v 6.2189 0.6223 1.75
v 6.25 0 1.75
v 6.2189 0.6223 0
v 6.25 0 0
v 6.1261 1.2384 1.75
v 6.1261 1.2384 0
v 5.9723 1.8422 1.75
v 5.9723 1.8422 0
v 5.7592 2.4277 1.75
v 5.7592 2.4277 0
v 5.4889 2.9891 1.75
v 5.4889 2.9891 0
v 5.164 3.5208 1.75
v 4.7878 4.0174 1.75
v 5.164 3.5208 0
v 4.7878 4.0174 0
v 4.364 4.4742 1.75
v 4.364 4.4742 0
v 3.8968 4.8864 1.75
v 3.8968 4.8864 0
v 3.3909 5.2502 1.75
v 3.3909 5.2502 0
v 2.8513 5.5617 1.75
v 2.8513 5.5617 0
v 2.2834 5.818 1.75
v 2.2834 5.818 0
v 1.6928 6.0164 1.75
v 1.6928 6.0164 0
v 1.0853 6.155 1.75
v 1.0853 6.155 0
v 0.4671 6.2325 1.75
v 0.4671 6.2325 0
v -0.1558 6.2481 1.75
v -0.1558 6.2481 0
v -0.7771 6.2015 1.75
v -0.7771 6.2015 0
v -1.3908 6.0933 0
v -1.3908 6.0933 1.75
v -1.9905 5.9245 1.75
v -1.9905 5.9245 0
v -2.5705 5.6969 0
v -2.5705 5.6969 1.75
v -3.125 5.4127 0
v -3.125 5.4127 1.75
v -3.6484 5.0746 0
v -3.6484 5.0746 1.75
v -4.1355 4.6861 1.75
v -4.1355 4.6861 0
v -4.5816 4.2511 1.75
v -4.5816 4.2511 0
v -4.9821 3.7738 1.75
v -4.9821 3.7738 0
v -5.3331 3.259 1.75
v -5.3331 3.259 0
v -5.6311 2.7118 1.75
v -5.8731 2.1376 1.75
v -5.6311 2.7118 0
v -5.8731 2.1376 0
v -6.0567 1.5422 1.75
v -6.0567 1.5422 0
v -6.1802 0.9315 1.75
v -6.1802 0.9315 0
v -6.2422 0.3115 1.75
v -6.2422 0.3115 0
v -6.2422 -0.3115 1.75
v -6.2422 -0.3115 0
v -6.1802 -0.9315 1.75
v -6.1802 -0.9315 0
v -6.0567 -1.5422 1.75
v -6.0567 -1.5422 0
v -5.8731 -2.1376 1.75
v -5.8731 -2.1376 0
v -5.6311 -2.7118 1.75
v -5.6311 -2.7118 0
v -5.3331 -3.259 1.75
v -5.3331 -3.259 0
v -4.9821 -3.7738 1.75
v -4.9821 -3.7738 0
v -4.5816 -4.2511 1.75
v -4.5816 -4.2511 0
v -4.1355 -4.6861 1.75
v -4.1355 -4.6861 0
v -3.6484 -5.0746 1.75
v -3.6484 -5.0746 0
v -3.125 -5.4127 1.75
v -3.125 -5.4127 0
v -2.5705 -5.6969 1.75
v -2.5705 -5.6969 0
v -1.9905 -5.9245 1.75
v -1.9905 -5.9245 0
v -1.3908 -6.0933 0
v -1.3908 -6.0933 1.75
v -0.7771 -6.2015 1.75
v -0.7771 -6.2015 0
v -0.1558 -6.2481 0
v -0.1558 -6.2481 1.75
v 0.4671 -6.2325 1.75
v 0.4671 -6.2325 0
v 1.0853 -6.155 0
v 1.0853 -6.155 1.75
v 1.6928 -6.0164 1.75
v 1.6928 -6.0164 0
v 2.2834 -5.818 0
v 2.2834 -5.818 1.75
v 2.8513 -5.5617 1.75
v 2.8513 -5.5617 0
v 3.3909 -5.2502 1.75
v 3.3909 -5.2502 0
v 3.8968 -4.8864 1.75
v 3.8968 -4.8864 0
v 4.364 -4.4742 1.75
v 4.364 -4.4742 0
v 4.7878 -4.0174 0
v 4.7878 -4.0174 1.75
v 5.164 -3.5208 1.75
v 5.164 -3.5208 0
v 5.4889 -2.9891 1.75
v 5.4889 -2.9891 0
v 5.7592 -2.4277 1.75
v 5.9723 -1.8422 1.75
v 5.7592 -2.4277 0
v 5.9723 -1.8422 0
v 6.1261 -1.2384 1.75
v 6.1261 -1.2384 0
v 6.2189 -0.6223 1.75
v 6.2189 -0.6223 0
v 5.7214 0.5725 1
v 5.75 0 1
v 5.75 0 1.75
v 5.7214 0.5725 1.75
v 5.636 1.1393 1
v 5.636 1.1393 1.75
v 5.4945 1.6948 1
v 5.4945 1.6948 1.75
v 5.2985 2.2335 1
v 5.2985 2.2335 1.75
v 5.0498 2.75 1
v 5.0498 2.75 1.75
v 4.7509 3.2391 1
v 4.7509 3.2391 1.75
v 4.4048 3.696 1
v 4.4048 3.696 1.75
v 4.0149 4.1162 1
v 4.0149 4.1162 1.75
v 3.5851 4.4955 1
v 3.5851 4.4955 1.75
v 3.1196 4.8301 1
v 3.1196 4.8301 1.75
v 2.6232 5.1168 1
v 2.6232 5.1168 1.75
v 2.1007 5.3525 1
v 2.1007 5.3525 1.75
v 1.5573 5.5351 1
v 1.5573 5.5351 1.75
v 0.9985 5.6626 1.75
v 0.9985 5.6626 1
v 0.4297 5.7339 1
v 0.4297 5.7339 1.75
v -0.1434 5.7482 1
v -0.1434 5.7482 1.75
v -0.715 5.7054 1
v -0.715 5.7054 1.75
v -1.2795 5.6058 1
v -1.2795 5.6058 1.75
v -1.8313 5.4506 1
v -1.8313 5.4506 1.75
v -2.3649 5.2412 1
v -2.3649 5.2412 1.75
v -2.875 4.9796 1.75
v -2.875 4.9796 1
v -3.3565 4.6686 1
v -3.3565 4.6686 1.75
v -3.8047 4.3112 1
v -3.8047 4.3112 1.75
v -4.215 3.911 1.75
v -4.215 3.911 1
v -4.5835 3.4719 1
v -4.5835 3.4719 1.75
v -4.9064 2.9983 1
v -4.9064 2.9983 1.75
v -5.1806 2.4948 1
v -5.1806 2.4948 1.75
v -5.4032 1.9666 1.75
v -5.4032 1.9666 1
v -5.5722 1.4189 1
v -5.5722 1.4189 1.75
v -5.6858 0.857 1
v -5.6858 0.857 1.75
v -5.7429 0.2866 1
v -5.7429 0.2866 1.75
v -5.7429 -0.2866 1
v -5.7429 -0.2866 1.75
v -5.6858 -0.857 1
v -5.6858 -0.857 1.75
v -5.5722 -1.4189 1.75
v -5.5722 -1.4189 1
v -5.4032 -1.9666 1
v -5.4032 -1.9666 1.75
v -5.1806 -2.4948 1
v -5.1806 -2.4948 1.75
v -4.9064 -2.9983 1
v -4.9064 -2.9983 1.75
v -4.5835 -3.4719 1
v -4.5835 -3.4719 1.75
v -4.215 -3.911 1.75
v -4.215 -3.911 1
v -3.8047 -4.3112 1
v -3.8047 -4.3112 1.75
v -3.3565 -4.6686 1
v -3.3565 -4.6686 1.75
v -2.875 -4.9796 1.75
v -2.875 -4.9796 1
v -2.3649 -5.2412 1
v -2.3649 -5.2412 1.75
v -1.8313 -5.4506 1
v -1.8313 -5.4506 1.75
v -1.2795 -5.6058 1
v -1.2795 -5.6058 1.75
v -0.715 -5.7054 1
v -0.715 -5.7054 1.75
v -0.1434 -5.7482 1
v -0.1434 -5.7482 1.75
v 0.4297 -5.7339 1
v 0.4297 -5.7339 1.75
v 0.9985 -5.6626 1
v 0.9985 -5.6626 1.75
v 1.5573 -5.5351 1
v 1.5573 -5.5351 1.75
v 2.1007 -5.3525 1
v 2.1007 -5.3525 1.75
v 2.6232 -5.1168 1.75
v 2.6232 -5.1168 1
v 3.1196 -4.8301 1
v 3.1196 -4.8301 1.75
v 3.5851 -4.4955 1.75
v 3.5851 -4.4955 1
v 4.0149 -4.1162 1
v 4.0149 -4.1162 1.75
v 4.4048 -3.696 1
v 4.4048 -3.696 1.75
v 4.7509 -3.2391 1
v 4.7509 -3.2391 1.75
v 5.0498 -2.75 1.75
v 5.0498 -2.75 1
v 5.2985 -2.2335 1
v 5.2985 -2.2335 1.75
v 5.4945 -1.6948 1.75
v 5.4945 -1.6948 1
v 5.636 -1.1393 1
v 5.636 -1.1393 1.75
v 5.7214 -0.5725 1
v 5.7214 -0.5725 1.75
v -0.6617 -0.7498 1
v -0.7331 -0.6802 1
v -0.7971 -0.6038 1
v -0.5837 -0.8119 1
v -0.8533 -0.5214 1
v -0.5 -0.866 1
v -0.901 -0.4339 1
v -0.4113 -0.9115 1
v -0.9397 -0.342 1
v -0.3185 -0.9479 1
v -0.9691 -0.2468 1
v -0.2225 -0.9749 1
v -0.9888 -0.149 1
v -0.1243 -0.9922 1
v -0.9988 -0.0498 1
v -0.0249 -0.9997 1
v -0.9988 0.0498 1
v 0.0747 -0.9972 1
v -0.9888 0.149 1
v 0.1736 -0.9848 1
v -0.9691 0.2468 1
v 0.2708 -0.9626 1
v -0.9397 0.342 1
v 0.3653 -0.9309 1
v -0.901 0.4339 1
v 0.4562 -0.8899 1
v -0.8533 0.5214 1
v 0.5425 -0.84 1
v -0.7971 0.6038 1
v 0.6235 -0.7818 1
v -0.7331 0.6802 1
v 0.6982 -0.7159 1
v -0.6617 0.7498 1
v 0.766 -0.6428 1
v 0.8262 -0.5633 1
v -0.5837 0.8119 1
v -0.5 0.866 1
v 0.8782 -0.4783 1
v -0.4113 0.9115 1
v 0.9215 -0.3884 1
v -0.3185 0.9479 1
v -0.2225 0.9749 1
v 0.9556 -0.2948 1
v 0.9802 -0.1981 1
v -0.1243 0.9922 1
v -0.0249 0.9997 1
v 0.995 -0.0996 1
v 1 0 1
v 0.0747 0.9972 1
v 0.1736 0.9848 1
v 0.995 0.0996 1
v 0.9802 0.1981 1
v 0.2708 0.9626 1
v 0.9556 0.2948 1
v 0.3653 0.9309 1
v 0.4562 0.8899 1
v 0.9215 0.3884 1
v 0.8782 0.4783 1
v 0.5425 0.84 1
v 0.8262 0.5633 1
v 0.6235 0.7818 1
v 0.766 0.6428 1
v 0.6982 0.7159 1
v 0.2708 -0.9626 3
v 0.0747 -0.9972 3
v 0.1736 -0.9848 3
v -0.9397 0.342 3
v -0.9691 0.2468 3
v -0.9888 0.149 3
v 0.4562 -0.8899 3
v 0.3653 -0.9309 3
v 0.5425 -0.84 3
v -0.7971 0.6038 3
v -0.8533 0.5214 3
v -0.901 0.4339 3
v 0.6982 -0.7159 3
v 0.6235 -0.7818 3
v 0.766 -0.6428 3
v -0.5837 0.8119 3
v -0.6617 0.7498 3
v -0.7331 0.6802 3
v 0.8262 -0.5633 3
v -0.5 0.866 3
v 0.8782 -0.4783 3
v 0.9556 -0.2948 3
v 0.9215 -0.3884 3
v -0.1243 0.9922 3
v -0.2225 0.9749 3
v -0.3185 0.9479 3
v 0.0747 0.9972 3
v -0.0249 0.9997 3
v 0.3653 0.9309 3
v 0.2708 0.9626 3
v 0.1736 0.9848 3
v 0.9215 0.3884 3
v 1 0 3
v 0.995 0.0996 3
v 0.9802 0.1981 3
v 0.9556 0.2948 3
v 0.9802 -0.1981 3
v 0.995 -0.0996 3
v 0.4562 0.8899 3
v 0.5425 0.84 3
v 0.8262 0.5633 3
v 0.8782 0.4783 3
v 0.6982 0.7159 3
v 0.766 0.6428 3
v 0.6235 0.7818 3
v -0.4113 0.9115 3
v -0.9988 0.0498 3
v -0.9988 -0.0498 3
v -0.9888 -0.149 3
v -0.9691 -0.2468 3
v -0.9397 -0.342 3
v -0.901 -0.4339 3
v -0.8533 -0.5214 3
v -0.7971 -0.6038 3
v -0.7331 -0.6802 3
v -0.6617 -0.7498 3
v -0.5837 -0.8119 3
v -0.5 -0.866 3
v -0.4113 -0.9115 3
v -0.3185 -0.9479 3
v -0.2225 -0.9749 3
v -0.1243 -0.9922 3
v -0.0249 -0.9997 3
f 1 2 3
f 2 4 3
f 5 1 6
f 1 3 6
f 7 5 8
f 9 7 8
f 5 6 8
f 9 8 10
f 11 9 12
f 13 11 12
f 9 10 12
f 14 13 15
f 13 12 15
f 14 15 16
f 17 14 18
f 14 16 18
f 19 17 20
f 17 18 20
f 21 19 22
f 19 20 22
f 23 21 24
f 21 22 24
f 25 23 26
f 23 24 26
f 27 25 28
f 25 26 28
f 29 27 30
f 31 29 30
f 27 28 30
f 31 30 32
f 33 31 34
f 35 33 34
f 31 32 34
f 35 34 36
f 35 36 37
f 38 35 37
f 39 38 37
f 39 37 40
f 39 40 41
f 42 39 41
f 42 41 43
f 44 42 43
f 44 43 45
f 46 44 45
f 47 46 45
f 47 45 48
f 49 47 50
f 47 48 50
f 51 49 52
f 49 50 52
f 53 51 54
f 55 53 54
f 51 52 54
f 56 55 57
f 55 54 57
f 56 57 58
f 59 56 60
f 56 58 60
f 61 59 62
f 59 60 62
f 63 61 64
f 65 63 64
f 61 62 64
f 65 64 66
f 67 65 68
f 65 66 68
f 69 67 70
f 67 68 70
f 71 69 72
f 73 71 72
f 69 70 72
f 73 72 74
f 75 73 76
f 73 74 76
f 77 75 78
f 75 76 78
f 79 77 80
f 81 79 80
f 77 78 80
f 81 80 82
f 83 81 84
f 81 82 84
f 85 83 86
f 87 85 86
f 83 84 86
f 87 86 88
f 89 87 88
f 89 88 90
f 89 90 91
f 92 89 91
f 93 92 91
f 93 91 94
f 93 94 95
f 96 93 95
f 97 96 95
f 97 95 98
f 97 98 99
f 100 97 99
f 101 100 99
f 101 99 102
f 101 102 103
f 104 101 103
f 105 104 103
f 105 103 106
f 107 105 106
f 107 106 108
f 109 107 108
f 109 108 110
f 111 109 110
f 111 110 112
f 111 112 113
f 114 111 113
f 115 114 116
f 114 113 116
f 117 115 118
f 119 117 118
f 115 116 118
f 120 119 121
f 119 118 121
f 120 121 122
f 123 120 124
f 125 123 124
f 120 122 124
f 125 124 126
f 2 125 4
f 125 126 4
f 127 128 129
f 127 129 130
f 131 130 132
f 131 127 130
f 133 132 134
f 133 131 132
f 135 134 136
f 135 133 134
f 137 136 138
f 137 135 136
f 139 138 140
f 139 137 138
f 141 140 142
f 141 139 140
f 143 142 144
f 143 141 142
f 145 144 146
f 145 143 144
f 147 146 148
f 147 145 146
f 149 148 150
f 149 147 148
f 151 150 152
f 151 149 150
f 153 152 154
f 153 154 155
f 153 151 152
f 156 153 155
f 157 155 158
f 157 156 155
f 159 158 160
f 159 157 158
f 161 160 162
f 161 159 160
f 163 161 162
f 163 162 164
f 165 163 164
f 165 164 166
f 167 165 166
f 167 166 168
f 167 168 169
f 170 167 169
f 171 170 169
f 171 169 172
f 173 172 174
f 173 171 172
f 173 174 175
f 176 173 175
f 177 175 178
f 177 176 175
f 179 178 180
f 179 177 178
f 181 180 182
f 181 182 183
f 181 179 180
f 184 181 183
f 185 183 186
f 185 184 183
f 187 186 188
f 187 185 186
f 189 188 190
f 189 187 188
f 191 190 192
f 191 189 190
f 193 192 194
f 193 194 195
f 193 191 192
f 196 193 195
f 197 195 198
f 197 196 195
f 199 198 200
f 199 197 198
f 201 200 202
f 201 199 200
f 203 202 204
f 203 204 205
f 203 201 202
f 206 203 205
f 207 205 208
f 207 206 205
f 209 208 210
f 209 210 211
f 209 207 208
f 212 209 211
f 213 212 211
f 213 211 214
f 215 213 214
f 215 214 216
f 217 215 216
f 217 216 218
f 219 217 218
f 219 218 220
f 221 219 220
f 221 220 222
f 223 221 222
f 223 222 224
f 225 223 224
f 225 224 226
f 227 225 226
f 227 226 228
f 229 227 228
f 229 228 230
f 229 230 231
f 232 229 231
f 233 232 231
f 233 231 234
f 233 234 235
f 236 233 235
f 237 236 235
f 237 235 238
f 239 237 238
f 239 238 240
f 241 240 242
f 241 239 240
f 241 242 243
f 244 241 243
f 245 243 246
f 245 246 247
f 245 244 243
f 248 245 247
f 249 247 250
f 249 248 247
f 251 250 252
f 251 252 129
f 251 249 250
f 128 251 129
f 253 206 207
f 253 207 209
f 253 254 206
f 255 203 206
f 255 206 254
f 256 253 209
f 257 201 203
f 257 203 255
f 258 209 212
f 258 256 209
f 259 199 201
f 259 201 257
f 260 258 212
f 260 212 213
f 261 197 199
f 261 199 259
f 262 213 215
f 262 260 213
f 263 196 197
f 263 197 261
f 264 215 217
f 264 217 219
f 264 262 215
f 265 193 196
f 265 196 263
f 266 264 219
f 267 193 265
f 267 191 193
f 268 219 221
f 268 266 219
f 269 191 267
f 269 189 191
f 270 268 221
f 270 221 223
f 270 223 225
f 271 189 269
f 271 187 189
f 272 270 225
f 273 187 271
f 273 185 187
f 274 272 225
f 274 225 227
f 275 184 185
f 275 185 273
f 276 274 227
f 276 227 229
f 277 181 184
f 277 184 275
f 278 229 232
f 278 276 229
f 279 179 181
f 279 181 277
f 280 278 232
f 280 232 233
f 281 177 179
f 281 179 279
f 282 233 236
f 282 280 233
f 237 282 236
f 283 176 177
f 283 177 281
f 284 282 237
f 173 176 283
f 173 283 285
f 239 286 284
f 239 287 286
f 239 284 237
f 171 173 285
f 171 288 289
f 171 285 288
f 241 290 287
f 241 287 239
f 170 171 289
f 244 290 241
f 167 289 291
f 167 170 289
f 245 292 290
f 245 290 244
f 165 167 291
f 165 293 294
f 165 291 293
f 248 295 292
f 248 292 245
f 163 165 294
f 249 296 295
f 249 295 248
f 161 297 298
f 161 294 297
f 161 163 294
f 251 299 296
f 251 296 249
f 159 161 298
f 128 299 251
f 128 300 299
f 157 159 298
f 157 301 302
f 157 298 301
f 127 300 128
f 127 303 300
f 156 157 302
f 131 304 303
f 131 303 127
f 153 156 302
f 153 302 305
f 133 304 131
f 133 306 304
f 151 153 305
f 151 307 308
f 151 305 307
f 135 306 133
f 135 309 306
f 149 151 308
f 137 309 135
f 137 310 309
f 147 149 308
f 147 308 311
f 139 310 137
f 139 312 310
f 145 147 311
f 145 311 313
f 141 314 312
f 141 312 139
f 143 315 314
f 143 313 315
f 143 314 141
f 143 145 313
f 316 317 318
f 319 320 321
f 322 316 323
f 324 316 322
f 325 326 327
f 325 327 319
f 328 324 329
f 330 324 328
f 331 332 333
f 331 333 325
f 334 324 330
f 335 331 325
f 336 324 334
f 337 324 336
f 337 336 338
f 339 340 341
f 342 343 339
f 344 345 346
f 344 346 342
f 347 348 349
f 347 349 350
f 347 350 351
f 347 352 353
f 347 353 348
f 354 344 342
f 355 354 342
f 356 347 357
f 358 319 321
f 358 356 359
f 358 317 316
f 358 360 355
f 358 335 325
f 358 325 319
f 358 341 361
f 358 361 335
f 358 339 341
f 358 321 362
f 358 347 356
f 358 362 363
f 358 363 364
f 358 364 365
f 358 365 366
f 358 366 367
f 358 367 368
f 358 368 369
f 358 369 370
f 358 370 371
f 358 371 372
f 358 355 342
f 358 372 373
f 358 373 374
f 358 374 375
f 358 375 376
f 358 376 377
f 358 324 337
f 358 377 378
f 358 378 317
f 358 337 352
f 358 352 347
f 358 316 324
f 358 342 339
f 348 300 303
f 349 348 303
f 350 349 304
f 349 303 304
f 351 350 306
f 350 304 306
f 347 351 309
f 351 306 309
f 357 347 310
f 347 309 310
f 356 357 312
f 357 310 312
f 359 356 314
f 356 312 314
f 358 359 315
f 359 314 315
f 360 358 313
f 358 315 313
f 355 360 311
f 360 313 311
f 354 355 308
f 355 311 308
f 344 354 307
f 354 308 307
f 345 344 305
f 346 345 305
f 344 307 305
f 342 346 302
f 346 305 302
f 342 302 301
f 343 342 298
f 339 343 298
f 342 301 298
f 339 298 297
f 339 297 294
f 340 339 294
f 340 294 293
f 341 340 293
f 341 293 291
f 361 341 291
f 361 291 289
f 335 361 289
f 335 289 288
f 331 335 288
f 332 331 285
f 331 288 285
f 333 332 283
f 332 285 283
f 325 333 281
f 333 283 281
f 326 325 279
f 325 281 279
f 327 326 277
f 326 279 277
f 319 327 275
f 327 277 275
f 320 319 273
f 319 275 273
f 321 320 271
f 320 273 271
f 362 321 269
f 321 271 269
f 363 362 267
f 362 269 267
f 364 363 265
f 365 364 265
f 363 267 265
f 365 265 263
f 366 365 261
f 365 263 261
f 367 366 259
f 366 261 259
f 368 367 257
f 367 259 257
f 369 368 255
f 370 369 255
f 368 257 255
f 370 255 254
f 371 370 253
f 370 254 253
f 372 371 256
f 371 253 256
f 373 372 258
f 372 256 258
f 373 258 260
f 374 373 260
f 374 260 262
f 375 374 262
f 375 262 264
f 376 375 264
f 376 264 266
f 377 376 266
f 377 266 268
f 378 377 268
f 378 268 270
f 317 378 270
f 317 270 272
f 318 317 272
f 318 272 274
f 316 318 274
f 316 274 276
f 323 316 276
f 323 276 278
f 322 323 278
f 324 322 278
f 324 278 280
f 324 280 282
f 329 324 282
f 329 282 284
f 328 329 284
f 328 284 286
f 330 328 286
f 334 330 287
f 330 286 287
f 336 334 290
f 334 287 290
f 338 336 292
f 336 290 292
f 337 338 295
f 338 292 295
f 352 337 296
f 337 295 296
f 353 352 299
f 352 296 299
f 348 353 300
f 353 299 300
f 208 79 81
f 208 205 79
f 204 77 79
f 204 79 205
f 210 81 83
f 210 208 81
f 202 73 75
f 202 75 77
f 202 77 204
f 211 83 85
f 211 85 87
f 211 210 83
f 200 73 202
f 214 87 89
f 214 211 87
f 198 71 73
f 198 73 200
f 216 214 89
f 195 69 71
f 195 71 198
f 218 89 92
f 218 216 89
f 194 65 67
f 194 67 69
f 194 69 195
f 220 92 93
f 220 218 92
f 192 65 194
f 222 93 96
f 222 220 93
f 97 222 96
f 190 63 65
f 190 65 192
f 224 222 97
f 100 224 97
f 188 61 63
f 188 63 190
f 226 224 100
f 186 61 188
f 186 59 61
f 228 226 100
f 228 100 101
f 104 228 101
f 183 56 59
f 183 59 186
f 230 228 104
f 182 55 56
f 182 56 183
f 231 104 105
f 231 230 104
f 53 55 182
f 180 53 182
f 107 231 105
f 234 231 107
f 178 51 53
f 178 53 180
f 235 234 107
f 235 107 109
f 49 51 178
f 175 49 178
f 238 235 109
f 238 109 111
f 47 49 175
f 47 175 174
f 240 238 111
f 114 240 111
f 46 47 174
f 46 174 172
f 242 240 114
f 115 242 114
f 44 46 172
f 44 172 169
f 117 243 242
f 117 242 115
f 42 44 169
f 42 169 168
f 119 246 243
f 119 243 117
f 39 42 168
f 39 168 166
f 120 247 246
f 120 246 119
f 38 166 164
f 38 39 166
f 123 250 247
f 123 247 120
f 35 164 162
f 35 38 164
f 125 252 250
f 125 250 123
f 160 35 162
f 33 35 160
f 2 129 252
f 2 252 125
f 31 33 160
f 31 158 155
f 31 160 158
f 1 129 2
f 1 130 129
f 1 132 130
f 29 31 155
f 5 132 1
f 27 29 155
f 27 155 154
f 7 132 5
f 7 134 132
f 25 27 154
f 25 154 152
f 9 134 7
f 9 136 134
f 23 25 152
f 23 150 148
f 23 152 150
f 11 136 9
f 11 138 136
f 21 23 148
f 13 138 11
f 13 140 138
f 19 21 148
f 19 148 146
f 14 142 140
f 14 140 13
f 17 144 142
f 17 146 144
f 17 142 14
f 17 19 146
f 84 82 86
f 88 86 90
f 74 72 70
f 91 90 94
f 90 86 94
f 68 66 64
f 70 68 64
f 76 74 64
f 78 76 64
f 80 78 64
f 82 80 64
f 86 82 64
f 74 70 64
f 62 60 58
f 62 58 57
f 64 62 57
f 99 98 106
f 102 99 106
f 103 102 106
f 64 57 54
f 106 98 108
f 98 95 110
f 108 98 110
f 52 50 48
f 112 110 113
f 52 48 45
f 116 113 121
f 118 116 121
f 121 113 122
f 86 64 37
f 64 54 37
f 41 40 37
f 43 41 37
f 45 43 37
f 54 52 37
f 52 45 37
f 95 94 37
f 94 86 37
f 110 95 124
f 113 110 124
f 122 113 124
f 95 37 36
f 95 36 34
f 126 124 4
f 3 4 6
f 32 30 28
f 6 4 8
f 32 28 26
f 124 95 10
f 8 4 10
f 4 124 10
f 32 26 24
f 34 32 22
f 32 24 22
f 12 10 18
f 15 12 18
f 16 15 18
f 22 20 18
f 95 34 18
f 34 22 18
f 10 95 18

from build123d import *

# Parameters (mm, degrees)
F0_R     = 6.25
F1_DEPTH = 1
F2_R     = 6.25
F2_R_2   = 5.75
F3_DEPTH = 0.75
F2_R_3   = 1
F4_DEPTH = 2


with BuildPart() as f1:
    # F0 (on Top) → F1 (new body)
    with BuildSketch(Plane.XY):
        Circle(F0_R)
    extrude(amount=F1_DEPTH)

    # F2 (on face) → F3 (join)
    with BuildSketch(Plane.XY.offset(1)):
        Circle(F2_R)
        Circle(F2_R_2, mode=Mode.SUBTRACT)
    extrude(amount=F3_DEPTH)

    # F2 (on face) → F4 (join)
    with BuildSketch(Plane.XY.offset(1)):
        Circle(F2_R_3)
    extrude(amount=F4_DEPTH)


solid = f1.part
